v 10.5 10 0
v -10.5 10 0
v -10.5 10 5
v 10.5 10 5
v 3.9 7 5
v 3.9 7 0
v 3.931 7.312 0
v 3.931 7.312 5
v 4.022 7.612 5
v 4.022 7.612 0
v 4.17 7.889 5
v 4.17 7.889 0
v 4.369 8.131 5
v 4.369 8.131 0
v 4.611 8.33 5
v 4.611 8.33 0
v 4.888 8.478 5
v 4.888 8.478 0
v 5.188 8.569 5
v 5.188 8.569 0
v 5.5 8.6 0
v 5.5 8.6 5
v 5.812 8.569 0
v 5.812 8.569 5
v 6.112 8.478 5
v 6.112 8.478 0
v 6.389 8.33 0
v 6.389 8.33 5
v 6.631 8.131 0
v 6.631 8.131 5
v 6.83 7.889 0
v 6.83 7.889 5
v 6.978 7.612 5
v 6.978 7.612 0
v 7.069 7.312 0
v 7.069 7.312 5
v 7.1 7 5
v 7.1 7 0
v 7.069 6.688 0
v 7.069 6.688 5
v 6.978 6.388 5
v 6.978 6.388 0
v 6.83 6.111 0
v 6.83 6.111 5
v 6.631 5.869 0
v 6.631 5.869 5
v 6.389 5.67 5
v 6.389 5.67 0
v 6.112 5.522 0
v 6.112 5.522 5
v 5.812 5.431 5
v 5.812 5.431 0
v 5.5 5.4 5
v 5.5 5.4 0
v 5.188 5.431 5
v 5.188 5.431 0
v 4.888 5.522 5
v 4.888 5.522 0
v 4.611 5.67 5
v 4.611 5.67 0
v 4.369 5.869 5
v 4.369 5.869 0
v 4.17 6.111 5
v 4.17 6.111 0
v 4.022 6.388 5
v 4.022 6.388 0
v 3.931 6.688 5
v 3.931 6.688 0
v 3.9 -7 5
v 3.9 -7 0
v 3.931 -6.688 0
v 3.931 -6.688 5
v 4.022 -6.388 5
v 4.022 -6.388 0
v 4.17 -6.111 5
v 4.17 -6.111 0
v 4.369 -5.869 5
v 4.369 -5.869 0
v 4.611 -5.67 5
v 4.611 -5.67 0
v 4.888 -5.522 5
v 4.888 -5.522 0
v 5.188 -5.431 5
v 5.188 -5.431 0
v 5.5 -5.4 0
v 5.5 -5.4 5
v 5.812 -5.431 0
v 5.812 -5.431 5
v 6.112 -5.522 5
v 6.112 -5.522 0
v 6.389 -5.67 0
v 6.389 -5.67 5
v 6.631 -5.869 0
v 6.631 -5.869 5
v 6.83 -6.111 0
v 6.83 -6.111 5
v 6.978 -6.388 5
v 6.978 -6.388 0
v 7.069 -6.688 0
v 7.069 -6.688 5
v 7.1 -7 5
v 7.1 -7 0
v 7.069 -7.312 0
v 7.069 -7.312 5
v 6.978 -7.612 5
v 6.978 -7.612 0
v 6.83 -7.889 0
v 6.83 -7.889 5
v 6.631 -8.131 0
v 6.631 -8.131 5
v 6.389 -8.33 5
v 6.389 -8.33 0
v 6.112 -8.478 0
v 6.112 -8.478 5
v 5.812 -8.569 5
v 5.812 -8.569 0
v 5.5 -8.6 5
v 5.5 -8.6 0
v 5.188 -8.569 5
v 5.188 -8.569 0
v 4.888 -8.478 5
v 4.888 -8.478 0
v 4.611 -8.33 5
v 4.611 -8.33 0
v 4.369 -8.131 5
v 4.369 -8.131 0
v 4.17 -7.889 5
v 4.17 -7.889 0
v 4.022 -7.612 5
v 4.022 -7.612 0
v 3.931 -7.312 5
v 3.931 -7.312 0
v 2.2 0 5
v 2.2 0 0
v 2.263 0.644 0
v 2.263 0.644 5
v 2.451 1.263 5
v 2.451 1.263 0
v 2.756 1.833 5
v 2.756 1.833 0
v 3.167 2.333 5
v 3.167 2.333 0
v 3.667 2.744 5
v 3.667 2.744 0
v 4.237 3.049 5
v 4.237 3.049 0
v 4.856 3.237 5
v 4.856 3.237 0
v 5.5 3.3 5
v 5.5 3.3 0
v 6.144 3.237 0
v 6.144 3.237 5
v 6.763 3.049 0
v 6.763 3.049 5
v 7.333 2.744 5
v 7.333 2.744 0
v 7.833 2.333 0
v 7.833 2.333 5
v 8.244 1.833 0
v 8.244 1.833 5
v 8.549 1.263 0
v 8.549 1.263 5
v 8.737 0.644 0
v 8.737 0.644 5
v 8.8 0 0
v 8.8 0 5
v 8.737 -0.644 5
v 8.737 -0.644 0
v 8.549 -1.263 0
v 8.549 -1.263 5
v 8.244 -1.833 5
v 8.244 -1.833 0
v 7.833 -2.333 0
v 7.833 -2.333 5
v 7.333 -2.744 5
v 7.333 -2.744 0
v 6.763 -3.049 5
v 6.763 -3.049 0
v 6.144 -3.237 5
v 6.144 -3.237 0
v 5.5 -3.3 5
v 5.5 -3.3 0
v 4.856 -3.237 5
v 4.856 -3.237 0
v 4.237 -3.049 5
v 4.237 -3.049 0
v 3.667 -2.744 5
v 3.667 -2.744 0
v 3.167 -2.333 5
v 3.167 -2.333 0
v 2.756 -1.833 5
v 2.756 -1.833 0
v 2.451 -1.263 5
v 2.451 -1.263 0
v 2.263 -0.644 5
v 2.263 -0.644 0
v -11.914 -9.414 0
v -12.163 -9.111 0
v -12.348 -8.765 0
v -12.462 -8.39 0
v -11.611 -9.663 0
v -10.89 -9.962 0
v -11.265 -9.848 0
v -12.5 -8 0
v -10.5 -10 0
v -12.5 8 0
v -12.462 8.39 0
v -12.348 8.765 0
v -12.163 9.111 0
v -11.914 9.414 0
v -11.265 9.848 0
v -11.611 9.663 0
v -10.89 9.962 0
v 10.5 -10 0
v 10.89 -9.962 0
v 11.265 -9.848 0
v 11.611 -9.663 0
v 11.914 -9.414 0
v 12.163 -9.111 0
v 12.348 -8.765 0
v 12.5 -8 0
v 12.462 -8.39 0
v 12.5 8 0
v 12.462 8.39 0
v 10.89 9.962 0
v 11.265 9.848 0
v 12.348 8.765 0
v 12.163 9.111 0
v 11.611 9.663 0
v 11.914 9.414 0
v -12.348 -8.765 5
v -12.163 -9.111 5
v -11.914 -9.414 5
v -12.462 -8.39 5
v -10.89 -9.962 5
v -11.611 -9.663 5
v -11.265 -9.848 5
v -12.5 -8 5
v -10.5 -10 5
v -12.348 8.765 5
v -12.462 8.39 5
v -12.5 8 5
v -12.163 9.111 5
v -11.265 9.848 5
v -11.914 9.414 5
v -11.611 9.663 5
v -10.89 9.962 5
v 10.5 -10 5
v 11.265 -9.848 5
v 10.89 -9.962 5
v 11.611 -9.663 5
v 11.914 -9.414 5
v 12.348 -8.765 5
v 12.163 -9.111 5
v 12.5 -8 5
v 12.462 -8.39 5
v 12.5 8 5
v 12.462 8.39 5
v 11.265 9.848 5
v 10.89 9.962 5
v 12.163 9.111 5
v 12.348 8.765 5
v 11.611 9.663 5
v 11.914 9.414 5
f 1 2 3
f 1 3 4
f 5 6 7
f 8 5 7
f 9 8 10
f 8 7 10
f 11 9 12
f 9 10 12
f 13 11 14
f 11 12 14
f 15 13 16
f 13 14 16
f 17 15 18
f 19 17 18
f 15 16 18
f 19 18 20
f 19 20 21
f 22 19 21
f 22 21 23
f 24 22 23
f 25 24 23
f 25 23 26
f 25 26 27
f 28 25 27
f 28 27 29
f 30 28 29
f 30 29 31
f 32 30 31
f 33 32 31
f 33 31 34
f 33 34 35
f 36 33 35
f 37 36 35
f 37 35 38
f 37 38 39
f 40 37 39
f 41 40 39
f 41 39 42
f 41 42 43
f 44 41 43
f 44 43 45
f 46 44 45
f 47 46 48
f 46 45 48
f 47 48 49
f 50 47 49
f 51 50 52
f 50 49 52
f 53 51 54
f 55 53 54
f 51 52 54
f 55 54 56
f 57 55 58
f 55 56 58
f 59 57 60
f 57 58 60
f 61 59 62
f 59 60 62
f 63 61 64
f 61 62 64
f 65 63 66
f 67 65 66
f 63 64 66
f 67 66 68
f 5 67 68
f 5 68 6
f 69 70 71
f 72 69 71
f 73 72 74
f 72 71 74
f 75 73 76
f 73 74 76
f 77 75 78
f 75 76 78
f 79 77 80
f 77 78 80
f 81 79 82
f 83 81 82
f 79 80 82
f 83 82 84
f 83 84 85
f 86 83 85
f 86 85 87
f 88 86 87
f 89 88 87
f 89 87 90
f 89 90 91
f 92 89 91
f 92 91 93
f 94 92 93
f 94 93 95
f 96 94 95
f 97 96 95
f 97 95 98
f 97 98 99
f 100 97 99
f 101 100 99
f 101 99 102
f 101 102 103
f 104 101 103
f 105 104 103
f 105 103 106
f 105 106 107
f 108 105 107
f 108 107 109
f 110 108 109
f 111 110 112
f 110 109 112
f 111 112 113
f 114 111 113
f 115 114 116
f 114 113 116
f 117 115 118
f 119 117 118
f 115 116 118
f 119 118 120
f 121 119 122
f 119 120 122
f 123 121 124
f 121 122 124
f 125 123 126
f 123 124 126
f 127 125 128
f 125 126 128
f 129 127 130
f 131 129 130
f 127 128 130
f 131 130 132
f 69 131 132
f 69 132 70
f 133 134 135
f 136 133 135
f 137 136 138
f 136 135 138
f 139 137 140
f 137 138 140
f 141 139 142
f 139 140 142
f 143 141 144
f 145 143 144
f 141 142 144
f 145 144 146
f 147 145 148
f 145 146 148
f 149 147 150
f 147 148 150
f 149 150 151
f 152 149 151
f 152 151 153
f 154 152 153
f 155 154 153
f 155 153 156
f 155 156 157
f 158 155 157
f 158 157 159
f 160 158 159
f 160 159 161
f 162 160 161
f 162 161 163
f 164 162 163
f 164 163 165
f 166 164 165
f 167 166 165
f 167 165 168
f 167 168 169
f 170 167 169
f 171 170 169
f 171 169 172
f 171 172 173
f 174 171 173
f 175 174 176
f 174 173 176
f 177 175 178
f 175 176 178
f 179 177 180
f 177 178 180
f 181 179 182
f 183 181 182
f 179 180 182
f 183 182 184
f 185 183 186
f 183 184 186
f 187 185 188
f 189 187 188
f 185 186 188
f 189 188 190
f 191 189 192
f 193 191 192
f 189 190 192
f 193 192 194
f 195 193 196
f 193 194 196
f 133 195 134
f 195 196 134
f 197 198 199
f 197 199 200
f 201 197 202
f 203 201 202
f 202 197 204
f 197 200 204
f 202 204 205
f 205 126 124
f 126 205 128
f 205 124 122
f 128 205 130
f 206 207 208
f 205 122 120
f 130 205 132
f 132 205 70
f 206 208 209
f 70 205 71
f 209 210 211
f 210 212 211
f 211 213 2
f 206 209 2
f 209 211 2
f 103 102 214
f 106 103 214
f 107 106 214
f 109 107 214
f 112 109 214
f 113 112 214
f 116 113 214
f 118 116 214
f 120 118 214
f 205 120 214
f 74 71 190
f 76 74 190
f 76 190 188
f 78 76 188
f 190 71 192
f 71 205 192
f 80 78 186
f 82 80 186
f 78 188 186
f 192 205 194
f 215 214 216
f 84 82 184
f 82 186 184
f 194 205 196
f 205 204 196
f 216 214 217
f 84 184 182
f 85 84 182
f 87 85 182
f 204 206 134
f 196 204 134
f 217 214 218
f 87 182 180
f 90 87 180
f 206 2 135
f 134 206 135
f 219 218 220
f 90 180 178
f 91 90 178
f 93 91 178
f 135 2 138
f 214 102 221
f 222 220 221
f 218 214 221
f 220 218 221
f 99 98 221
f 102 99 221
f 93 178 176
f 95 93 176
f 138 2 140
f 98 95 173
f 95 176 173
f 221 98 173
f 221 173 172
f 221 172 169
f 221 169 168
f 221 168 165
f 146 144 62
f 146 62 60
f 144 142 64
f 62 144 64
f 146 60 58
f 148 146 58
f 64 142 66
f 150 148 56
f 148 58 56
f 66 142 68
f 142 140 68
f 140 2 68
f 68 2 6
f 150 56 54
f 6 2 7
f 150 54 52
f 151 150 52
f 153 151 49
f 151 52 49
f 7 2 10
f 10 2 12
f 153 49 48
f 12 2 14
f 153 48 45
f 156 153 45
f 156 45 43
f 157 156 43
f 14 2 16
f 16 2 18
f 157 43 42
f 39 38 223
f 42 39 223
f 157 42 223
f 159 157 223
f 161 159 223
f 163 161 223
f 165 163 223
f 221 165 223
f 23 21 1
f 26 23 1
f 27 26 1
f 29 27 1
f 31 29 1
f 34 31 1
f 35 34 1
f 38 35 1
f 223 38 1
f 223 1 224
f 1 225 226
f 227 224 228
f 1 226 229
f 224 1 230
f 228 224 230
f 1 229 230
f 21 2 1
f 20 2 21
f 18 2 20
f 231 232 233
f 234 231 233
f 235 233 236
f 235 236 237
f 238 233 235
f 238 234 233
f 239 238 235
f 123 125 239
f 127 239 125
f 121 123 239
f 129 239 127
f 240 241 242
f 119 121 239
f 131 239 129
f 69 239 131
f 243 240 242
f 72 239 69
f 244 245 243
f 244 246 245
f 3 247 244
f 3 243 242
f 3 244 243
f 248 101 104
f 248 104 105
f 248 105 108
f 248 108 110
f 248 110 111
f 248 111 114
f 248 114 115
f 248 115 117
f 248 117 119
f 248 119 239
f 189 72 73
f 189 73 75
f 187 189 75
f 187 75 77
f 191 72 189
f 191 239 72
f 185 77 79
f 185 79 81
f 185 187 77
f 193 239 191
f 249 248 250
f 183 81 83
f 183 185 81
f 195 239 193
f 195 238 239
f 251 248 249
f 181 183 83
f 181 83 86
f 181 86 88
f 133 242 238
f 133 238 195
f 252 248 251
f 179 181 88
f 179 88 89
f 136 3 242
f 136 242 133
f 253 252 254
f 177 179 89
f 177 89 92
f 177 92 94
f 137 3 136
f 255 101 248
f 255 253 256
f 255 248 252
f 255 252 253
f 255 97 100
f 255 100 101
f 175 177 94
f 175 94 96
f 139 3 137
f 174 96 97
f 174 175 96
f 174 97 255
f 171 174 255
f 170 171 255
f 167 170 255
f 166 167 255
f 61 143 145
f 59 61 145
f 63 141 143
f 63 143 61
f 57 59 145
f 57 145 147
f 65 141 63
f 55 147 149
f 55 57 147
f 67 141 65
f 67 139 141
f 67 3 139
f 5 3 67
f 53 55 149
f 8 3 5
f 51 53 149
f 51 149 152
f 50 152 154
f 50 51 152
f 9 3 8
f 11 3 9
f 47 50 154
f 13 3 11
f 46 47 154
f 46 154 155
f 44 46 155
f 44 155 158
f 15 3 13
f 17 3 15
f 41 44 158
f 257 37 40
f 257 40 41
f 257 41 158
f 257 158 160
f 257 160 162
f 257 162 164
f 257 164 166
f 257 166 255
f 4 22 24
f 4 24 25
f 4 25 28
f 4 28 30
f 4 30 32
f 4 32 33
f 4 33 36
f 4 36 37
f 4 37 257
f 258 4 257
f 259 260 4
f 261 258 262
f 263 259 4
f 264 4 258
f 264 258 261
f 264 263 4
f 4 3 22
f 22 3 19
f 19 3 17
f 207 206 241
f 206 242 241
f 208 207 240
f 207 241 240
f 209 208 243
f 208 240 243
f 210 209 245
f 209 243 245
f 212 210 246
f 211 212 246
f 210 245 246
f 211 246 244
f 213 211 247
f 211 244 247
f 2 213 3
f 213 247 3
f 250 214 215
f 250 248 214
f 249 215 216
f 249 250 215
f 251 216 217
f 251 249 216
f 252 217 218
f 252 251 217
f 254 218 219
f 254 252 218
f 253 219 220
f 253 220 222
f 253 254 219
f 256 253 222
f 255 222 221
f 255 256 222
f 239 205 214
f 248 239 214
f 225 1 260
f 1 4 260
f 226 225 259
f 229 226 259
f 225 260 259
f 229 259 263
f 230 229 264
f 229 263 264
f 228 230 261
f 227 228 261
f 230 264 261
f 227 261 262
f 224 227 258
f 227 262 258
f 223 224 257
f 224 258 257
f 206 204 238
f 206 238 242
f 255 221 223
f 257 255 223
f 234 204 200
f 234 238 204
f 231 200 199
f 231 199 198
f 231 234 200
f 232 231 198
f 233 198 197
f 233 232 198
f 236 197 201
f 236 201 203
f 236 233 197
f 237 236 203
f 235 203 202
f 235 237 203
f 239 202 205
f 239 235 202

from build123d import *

# Parameters (mm, degrees)
F0_W     = 25
F0_H     = 20
F1_DEPTH = 5
F3_D     = 6.6
F3_DEPTH = 10
F3_TIP   = 1.9828400428
F4_R     = 2
F6_D     = 3.2
F6_DEPTH = 6
F6_TIP   = 0.9613769904


with BuildPart() as f1:
    # F0 (on Top) → F1 (new body)
    with BuildSketch(Plane.XY):
        Rectangle(F0_W, F0_H)
    extrude(amount=F1_DEPTH)

    # F3
    with Locations(Plane.XY.offset(5)):
        with Locations((5.5, 0)):
            Hole(F3_D / 2, depth=F3_DEPTH)
            with Locations((0, 0, -(F3_DEPTH + F3_TIP / 2))):  # 118° drill point
                Cone(0, F3_D / 2, F3_TIP, mode=Mode.SUBTRACT)

    # F4
    f4_edges = [f1.edges().sort_by_distance(p)[0] for p in [
        (-12.5, -10, 2.5),
        (-12.5, 10, 2.5),
        (12.5, -10, 2.5),
        (12.5, 10, 2.5),
    ]]
    fillet(f4_edges, radius=F4_R)

    # F6
    with Locations(Plane.XY.offset(5)):
        with Locations((5.5, 7), (5.5, -7)):
            Hole(F6_D / 2, depth=F6_DEPTH)
            with Locations((0, 0, -(F6_DEPTH + F6_TIP / 2))):  # 118° drill point
                Cone(0, F6_D / 2, F6_TIP, mode=Mode.SUBTRACT)


solid = f1.part
